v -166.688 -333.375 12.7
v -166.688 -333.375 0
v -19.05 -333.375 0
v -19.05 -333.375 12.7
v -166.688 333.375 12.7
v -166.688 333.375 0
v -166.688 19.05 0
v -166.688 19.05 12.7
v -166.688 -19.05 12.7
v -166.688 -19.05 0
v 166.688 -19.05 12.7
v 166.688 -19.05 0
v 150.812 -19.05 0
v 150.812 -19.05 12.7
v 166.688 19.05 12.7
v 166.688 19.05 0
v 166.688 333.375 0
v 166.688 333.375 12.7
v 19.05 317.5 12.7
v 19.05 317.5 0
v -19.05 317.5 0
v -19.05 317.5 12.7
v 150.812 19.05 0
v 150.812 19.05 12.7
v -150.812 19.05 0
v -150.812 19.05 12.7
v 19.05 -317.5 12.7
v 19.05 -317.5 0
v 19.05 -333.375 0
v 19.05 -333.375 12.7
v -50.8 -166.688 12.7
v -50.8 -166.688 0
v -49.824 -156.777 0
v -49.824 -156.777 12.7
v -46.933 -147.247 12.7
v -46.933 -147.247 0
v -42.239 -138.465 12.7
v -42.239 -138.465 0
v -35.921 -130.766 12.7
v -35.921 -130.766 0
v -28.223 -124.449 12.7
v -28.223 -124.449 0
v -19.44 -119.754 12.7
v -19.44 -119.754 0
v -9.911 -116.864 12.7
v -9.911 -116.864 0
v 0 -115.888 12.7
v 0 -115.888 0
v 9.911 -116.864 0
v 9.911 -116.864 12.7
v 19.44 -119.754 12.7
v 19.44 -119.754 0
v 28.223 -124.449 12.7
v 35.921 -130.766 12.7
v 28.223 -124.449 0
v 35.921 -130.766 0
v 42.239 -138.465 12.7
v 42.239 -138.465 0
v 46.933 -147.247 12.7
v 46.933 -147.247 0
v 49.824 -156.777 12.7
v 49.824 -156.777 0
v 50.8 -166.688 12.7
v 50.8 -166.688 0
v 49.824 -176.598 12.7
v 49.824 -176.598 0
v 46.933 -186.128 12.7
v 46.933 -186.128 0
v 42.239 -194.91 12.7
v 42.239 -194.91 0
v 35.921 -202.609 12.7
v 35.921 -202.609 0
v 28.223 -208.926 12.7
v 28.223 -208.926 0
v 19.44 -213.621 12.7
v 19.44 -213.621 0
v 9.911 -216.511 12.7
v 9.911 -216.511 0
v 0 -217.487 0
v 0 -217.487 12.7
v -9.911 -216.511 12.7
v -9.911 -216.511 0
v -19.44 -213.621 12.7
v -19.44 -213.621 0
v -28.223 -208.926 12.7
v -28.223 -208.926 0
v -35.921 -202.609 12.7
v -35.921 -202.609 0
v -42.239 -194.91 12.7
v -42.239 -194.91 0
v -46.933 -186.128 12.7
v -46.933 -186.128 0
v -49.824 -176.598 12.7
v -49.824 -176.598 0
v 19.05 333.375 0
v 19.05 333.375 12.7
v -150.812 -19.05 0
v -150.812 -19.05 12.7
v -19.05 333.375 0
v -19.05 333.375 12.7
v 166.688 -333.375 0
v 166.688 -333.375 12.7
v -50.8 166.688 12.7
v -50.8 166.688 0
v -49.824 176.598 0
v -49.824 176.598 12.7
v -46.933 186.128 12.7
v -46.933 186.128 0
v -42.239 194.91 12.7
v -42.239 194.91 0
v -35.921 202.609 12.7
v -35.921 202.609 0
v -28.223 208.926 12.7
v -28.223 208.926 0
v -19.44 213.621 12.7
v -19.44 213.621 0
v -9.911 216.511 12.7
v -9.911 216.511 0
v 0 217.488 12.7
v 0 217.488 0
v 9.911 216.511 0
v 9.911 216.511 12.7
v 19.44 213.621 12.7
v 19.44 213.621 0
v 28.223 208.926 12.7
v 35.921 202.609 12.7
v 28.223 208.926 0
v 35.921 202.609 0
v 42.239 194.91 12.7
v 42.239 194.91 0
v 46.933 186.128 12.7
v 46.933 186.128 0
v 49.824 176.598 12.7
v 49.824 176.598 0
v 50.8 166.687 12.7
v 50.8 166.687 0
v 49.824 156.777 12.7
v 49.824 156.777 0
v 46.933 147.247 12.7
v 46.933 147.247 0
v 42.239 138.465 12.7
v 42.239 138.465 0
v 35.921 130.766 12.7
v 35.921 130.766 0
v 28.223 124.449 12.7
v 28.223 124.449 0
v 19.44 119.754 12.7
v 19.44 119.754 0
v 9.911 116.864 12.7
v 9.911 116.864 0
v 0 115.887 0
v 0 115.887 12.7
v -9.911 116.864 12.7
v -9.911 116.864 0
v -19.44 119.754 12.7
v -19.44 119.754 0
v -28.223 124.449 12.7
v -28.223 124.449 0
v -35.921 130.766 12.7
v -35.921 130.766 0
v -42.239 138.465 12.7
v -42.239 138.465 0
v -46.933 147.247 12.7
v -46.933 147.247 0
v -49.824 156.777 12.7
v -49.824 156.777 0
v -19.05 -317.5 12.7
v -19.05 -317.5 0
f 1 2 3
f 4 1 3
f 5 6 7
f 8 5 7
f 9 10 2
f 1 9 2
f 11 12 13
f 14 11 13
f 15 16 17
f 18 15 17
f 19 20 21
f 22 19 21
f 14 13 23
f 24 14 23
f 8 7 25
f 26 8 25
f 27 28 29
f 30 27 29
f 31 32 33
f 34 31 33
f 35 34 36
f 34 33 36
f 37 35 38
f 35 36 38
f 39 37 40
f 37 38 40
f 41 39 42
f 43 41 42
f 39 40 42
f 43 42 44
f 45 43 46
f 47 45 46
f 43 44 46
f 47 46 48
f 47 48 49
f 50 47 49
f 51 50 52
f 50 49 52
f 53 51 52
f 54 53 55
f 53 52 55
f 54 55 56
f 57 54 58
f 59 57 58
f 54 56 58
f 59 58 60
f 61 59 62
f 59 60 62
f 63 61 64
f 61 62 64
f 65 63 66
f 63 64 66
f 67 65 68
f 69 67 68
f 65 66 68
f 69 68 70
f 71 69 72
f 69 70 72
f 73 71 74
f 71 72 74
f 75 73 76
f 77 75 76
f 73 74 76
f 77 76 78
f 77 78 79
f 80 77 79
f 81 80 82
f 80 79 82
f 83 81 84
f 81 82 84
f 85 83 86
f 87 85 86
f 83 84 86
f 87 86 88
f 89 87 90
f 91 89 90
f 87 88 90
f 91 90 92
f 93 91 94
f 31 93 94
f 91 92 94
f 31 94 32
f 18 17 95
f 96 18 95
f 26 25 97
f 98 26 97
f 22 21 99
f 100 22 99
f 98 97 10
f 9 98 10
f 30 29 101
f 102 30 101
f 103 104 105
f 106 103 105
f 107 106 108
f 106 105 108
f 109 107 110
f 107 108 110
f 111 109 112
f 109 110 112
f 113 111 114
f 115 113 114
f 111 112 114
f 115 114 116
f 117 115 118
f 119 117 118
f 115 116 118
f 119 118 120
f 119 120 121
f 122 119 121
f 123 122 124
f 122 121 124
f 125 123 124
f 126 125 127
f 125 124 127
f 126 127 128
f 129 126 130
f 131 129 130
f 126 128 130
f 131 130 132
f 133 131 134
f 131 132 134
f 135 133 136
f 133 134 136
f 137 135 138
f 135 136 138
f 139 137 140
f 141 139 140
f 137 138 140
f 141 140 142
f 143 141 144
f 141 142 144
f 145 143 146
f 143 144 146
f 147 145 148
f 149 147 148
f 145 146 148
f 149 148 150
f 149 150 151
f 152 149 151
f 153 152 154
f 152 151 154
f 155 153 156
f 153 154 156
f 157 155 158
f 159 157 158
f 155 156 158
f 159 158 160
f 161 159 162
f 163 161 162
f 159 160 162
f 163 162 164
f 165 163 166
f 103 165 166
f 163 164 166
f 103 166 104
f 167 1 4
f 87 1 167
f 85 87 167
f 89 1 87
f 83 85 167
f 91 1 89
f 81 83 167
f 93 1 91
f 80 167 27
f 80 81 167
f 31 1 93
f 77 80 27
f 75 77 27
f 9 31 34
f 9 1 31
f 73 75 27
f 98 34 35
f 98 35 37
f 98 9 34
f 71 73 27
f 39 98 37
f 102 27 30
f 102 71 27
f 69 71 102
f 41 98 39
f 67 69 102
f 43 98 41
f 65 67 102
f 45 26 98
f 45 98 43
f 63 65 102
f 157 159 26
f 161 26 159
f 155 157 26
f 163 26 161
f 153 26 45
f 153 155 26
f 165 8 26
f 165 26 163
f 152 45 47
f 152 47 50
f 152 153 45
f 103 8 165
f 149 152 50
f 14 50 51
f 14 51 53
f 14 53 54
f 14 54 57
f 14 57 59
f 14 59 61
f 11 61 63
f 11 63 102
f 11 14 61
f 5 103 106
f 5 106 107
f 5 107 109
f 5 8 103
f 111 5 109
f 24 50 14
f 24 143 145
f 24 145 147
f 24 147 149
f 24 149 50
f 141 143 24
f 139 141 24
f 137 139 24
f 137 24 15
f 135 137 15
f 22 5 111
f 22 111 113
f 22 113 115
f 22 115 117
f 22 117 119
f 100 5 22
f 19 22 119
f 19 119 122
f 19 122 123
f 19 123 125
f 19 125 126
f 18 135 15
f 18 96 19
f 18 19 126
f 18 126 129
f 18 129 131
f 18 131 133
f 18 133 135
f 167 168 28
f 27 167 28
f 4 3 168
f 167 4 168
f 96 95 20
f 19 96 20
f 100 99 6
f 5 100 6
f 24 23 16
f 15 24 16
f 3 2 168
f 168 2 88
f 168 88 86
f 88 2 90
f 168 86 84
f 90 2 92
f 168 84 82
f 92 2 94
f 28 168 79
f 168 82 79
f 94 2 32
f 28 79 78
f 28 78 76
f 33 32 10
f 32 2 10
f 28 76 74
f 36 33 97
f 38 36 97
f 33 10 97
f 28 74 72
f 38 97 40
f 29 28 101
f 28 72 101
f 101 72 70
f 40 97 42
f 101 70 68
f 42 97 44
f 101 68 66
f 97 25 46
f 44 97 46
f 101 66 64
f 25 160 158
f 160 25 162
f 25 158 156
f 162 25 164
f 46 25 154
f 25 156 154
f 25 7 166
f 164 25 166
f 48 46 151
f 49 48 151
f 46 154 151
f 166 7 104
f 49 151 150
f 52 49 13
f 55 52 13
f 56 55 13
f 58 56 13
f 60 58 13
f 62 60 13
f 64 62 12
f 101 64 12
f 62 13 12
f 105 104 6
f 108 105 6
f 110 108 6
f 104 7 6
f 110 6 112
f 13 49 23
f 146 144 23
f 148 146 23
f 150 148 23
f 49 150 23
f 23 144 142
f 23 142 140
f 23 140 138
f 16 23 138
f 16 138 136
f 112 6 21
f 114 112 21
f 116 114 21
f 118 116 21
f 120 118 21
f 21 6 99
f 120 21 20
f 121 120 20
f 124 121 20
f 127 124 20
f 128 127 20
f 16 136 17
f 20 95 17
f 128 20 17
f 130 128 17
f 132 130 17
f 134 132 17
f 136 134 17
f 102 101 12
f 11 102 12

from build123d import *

# Parameters (mm, degrees)
F1_DEPTH = 12.7


with BuildPart() as f1:
    # F0 (on Top) → F1 (new body)
    with BuildSketch(Plane.XY):
        with BuildLine():
            Line((166.6875, -333.375), (166.6875, -166.6875))
            Line((166.6875, -166.6875), (50.8, -166.6875))
            ThreePointArc((50.8, -166.6875), (0, -217.4875), (-50.8, -166.6875))
            Line((-50.8, -166.6875), (-166.6875, -166.6875))
            Line((-166.6875, -166.6875), (-166.6875, -333.375))
            Line((-166.6875, -333.375), (-19.05, -333.375))
            Line((-19.05, -333.375), (-19.05, -317.5))
            Line((-19.05, -317.5), (19.05, -317.5))
            Line((19.05, -317.5), (19.05, -333.375))
            Line((19.05, -333.375), (166.6875, -333.375))
        make_face()
        with BuildLine():
            Line((50.8, 166.6875), (166.6875, 166.6875))
            Line((166.6875, 166.6875), (166.6875, 333.375))
            Line((166.6875, 333.375), (19.05, 333.375))
            Line((19.05, 333.375), (19.05, 317.5))
            Line((19.05, 317.5), (-19.05, 317.5))
            Line((-19.05, 317.5), (-19.05, 333.375))
            Line((-19.05, 333.375), (-166.6875, 333.375))
            Line((-166.6875, 333.375), (-166.6875, 166.6875))
            Line((-166.6875, 166.6875), (-50.8, 166.6875))
            ThreePointArc((-50.8, 166.6875), (0, 217.4875), (50.8, 166.6875))
        make_face()
        with BuildLine():
            Line((50.8, -166.6875), (166.6875, -166.6875))
            Line((166.6875, -166.6875), (166.6875, -19.05))
            Line((166.6875, -19.05), (150.8125, -19.05))
            Line((150.8125, -19.05), (150.8125, 19.05))
            Line((150.8125, 19.05), (166.6875, 19.05))
            Line((166.6875, 19.05), (166.6875, 166.6875))
            Line((166.6875, 166.6875), (50.8, 166.6875))
            ThreePointArc((50.8, 166.6875), (0, 115.8875), (-50.8, 166.6875))
            Line((-50.8, 166.6875), (-166.6875, 166.6875))
            Line((-166.6875, 166.6875), (-166.6875, 19.05))
            Line((-166.6875, 19.05), (-150.8125, 19.05))
            Line((-150.8125, 19.05), (-150.8125, -19.05))
            Line((-150.8125, -19.05), (-166.6875, -19.05))
            Line((-166.6875, -19.05), (-166.6875, -166.6875))
            Line((-166.6875, -166.6875), (-50.8, -166.6875))
            ThreePointArc((-50.8, -166.6875), (0, -115.8875), (50.8, -166.6875))
        make_face()
    extrude(amount=F1_DEPTH)


solid = f1.part
